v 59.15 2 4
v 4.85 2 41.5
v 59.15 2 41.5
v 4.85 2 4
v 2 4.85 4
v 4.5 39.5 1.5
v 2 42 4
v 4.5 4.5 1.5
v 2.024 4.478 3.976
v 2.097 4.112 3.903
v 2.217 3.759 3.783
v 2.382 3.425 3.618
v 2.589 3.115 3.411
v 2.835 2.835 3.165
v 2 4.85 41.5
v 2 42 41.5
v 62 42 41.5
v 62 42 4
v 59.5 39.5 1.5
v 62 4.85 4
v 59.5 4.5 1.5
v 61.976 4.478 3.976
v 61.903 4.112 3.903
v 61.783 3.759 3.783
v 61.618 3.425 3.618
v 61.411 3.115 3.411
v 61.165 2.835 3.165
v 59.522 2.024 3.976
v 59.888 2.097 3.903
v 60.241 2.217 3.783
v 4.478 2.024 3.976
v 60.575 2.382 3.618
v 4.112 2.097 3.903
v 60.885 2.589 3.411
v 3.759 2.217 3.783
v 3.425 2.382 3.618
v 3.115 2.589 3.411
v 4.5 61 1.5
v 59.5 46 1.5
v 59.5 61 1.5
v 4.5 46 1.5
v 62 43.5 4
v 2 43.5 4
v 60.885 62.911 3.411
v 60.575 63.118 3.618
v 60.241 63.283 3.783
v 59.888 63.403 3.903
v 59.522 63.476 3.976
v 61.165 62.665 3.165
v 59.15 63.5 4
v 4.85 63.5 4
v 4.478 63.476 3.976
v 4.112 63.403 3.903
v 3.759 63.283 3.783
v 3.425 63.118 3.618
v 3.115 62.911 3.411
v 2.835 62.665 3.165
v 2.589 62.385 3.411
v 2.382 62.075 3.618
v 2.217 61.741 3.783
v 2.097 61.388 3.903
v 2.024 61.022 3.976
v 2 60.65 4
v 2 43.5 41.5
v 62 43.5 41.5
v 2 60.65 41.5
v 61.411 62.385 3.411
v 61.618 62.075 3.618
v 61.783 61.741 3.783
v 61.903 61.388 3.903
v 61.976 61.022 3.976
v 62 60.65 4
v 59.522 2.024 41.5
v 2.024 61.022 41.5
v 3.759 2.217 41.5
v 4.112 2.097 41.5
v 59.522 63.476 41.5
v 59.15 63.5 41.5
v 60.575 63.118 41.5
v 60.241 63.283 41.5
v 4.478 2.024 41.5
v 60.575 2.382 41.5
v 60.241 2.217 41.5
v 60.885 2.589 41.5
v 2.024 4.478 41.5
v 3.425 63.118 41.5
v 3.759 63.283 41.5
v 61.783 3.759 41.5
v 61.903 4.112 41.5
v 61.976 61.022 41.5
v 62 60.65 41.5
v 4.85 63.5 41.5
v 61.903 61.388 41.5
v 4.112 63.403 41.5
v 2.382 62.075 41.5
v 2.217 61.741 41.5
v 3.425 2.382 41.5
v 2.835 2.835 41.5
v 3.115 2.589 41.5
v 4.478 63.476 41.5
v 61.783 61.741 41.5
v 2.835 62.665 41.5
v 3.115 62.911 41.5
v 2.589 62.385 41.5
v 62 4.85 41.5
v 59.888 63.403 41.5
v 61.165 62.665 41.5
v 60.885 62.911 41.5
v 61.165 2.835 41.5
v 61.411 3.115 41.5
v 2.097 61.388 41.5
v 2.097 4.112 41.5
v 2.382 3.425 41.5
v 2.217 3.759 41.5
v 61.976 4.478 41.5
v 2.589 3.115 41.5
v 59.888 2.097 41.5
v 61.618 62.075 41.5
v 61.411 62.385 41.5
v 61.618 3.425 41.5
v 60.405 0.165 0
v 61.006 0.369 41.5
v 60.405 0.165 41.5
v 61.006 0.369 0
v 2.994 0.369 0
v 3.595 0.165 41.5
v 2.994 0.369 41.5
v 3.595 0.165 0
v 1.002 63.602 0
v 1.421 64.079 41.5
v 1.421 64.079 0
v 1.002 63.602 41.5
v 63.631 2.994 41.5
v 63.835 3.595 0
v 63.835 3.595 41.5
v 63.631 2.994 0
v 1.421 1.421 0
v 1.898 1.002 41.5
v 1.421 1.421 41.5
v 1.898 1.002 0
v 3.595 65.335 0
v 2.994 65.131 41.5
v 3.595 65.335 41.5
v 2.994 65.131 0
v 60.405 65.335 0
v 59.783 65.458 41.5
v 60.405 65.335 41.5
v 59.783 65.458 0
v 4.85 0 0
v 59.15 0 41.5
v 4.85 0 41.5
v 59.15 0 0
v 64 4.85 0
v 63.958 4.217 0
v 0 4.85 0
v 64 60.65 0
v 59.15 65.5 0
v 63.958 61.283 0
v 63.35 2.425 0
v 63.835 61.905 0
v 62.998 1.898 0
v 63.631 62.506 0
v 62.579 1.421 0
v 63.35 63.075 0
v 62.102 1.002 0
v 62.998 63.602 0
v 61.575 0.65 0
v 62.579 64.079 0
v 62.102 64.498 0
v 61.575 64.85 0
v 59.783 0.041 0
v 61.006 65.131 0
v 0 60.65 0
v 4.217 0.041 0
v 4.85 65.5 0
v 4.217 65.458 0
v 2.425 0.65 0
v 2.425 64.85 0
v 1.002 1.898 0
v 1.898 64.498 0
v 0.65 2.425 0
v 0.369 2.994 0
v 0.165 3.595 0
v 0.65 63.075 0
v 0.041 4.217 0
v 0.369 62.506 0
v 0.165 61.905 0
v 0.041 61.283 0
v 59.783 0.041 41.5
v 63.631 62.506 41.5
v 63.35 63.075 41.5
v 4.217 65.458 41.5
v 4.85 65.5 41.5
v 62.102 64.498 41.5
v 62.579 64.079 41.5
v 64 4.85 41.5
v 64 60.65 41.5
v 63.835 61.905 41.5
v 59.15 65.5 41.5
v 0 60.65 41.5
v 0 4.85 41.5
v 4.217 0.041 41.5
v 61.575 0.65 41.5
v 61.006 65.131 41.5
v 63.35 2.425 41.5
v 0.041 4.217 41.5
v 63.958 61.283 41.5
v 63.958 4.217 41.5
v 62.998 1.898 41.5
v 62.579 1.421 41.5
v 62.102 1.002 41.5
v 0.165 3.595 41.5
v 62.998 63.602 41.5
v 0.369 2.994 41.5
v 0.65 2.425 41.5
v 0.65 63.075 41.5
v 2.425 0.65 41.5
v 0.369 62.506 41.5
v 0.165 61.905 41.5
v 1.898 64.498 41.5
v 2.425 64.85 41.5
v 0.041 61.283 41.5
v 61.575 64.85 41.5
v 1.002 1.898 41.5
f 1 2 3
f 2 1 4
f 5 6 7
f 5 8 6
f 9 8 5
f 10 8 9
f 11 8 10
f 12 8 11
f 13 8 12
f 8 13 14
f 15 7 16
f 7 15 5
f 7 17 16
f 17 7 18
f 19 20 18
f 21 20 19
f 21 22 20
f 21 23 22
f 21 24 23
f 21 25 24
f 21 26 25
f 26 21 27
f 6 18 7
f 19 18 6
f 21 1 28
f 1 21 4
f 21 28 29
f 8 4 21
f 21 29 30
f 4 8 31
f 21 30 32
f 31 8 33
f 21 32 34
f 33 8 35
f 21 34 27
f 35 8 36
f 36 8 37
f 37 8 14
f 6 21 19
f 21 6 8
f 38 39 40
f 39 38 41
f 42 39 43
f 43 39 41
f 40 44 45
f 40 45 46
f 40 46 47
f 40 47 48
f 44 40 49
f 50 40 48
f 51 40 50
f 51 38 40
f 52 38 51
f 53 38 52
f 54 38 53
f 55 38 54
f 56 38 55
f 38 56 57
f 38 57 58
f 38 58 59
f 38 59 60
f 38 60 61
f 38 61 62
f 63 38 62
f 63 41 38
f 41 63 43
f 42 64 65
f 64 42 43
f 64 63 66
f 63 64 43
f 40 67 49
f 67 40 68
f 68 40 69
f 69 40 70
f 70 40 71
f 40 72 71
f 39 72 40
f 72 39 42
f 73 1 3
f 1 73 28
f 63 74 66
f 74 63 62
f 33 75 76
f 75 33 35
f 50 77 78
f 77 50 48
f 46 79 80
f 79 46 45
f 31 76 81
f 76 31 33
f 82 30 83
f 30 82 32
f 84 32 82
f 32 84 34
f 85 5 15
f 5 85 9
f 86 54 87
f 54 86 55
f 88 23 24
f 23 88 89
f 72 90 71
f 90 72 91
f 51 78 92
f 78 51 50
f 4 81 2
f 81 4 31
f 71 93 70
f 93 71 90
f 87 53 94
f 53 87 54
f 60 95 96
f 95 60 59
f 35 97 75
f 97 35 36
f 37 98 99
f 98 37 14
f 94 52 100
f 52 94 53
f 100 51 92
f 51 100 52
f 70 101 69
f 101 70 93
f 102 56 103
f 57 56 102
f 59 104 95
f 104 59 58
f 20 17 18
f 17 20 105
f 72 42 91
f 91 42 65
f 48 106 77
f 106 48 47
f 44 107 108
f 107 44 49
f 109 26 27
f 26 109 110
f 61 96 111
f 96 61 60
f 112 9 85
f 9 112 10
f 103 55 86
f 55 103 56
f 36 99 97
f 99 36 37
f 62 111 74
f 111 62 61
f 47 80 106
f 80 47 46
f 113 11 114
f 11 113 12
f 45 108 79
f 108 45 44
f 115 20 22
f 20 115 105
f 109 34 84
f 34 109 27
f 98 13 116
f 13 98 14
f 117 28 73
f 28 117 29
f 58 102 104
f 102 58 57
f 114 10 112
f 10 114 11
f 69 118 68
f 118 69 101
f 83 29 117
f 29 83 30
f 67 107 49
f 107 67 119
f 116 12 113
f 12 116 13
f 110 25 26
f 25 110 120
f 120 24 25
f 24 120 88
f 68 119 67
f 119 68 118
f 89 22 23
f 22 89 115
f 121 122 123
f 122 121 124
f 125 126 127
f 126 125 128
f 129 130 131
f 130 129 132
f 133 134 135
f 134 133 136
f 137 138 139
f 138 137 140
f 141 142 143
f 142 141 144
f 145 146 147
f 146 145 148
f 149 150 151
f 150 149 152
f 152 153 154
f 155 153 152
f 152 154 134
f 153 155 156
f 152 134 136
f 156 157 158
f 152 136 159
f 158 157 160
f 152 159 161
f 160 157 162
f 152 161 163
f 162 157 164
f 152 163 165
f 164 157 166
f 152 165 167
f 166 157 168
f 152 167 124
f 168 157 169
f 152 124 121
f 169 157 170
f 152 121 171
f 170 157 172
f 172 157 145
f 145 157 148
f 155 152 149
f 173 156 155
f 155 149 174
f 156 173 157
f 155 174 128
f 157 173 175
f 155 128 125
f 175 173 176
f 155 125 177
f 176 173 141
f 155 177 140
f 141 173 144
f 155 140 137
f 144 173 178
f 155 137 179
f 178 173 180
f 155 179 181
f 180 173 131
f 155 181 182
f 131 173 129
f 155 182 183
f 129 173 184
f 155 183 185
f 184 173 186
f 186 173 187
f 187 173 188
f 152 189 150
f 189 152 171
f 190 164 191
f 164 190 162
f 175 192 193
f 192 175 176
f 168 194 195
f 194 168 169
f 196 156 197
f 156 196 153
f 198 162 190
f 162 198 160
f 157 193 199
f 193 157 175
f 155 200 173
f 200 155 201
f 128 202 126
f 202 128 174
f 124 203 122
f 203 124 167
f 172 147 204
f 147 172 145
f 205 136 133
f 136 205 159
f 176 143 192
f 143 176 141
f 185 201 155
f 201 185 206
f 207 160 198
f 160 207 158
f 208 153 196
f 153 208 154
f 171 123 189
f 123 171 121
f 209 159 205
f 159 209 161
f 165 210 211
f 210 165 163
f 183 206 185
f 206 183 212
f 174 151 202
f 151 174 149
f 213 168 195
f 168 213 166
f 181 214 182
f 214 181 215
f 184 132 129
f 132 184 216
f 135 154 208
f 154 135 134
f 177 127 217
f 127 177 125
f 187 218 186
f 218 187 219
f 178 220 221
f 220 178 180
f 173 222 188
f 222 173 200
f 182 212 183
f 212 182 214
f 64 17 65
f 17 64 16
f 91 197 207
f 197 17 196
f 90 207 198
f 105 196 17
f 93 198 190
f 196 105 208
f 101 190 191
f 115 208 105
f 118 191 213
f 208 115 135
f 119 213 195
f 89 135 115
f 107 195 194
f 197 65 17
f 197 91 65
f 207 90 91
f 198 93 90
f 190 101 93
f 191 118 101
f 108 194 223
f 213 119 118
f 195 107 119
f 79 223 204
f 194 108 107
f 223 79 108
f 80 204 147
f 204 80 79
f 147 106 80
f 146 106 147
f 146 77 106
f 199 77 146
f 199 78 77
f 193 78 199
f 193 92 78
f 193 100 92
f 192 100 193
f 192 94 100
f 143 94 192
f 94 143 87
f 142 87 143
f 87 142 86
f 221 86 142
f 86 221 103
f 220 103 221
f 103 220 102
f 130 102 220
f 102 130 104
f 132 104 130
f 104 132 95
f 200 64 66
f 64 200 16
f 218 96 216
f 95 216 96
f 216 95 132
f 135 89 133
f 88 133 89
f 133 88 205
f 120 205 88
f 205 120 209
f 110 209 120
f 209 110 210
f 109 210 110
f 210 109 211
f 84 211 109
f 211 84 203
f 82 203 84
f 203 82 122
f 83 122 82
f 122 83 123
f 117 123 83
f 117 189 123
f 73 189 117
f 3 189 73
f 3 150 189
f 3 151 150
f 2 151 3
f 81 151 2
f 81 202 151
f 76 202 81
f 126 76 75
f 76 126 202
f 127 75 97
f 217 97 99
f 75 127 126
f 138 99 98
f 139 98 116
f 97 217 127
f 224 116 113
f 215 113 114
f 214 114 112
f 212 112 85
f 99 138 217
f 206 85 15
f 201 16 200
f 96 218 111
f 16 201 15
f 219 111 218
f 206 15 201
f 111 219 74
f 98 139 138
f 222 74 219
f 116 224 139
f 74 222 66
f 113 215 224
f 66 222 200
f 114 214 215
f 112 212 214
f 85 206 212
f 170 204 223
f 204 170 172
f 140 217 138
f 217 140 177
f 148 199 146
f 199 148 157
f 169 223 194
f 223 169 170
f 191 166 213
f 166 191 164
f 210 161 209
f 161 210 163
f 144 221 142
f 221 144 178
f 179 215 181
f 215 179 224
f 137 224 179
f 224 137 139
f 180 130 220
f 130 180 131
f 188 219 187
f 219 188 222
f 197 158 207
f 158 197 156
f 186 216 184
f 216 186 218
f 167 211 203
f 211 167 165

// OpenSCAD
// cubby_insert.scad — a parametric divided-tray insert.
//
// Original to BoxBot (no third-party attribution). Two ways to describe the
// compartments:
//   • a regular grid via col_widths[] (X) and row_lengths[] (Y), or
//   • an explicit `pockets` list of [x, y, w, l] cells (interior-local, with
//     0,0 at the inside-wall corner) — which lets cubby.py lay out ragged /
//     nested arrangements (odd counts, varying sizes) that a col×row grid can't.
// When `pockets` is non-empty it wins, and the caller passes the tray's outer
// inner_w/inner_l directly; otherwise the outer size is derived from the grid.
//
// Driven entirely by -D overrides from cubby.py — nothing here knows which box
// it goes into.

/* [Grid (used when pockets is empty)] */
col_widths = [60];
row_lengths = [40, 20];
divider_thickness = 1.5;

/* [Explicit pockets (override)] */
// Each entry is [x, y, w, l] in interior-local mm (0,0 = inside-wall corner).
pockets = [];
// Tray outer size, required in pockets mode.
inner_w = 0;
inner_l = 0;

/* [Tray] */
insert_height = 41.5;
corner_radius = 4.85;
chamfer = 2.5;
wall_thickness = 2;
floor_thickness = 1.5;

// --- internal ---
$fn = 48;

use_pockets = len(pockets) > 0;

// Sum of the first n entries of a vector (recursive — OpenSCAD has no cumsum).
function csum(v, n) = n <= 0 ? 0 : v[n - 1] + csum(v, n - 1);

grid_span_w = csum(col_widths, len(col_widths))
              + (len(col_widths) - 1) * divider_thickness;
grid_span_l = csum(row_lengths, len(row_lengths))
              + (len(row_lengths) - 1) * divider_thickness;

outer_w = use_pockets ? inner_w : grid_span_w + 2 * wall_thickness;
outer_l = use_pockets ? inner_l : grid_span_l + 2 * wall_thickness;
span_w = outer_w - 2 * wall_thickness;
span_l = outer_l - 2 * wall_thickness;
pocket_h = insert_height - floor_thickness;      // open through the top
inner_radius = max(0, corner_radius - wall_thickness);

// Lower-left corner of grid cell (i, j), inside the tray walls.
function pos_x(i) = csum(col_widths, i) + i * divider_thickness;
function pos_y(j) = csum(row_lengths, j) + j * divider_thickness;

// A box with rounded vertical (Z) edges.
module rounded_box(w, l, h, r) {
    if (r > 0) {
        translate([r, r, 0])
            linear_extrude(height = h)
                offset(r = r)
                    square([w - 2 * r, l - 2 * r]);
    } else {
        cube([w, l, h]);
    }
}

// One compartment pocket with a 45-degree scoop ramp at the bottom.
module chamfered_pocket(w, l, h, cb) {
    if (cb > 0 && w > 2 * cb && l > 2 * cb) {
        hull() {
            translate([0, 0, cb]) cube([w, l, h - cb]);
            translate([cb, cb, 0]) cube([w - 2 * cb, l - 2 * cb, 0.1]);
        }
    } else {
        cube([w, l, h]);   // fallback when the chamfer won't fit the cell
    }
}

// Every compartment pocket, positioned inside the tray walls.
module all_pockets() {
    if (use_pockets) {
        for (p = pockets)
            translate([wall_thickness + p[0], wall_thickness + p[1], floor_thickness])
                chamfered_pocket(p[2], p[3], pocket_h + 1, chamfer);
    } else {
        for (i = [0 : len(col_widths) - 1])
            for (j = [0 : len(row_lengths) - 1])
                translate([wall_thickness + pos_x(i), wall_thickness + pos_y(j),
                           floor_thickness])
                    chamfered_pocket(col_widths[i], row_lengths[j],
                                     pocket_h + 1, chamfer);
    }
}

module cubby_insert() {
    difference() {
        rounded_box(outer_w, outer_l, insert_height, corner_radius);
        // Mask the pockets to the rounded inner cavity so corners stay clean
        // and the outer wall is never breached.
        intersection() {
            translate([wall_thickness, wall_thickness, floor_thickness])
                rounded_box(span_w, span_l, pocket_h + 1, inner_radius);
            all_pockets();
        }
    }
}

cubby_insert();
